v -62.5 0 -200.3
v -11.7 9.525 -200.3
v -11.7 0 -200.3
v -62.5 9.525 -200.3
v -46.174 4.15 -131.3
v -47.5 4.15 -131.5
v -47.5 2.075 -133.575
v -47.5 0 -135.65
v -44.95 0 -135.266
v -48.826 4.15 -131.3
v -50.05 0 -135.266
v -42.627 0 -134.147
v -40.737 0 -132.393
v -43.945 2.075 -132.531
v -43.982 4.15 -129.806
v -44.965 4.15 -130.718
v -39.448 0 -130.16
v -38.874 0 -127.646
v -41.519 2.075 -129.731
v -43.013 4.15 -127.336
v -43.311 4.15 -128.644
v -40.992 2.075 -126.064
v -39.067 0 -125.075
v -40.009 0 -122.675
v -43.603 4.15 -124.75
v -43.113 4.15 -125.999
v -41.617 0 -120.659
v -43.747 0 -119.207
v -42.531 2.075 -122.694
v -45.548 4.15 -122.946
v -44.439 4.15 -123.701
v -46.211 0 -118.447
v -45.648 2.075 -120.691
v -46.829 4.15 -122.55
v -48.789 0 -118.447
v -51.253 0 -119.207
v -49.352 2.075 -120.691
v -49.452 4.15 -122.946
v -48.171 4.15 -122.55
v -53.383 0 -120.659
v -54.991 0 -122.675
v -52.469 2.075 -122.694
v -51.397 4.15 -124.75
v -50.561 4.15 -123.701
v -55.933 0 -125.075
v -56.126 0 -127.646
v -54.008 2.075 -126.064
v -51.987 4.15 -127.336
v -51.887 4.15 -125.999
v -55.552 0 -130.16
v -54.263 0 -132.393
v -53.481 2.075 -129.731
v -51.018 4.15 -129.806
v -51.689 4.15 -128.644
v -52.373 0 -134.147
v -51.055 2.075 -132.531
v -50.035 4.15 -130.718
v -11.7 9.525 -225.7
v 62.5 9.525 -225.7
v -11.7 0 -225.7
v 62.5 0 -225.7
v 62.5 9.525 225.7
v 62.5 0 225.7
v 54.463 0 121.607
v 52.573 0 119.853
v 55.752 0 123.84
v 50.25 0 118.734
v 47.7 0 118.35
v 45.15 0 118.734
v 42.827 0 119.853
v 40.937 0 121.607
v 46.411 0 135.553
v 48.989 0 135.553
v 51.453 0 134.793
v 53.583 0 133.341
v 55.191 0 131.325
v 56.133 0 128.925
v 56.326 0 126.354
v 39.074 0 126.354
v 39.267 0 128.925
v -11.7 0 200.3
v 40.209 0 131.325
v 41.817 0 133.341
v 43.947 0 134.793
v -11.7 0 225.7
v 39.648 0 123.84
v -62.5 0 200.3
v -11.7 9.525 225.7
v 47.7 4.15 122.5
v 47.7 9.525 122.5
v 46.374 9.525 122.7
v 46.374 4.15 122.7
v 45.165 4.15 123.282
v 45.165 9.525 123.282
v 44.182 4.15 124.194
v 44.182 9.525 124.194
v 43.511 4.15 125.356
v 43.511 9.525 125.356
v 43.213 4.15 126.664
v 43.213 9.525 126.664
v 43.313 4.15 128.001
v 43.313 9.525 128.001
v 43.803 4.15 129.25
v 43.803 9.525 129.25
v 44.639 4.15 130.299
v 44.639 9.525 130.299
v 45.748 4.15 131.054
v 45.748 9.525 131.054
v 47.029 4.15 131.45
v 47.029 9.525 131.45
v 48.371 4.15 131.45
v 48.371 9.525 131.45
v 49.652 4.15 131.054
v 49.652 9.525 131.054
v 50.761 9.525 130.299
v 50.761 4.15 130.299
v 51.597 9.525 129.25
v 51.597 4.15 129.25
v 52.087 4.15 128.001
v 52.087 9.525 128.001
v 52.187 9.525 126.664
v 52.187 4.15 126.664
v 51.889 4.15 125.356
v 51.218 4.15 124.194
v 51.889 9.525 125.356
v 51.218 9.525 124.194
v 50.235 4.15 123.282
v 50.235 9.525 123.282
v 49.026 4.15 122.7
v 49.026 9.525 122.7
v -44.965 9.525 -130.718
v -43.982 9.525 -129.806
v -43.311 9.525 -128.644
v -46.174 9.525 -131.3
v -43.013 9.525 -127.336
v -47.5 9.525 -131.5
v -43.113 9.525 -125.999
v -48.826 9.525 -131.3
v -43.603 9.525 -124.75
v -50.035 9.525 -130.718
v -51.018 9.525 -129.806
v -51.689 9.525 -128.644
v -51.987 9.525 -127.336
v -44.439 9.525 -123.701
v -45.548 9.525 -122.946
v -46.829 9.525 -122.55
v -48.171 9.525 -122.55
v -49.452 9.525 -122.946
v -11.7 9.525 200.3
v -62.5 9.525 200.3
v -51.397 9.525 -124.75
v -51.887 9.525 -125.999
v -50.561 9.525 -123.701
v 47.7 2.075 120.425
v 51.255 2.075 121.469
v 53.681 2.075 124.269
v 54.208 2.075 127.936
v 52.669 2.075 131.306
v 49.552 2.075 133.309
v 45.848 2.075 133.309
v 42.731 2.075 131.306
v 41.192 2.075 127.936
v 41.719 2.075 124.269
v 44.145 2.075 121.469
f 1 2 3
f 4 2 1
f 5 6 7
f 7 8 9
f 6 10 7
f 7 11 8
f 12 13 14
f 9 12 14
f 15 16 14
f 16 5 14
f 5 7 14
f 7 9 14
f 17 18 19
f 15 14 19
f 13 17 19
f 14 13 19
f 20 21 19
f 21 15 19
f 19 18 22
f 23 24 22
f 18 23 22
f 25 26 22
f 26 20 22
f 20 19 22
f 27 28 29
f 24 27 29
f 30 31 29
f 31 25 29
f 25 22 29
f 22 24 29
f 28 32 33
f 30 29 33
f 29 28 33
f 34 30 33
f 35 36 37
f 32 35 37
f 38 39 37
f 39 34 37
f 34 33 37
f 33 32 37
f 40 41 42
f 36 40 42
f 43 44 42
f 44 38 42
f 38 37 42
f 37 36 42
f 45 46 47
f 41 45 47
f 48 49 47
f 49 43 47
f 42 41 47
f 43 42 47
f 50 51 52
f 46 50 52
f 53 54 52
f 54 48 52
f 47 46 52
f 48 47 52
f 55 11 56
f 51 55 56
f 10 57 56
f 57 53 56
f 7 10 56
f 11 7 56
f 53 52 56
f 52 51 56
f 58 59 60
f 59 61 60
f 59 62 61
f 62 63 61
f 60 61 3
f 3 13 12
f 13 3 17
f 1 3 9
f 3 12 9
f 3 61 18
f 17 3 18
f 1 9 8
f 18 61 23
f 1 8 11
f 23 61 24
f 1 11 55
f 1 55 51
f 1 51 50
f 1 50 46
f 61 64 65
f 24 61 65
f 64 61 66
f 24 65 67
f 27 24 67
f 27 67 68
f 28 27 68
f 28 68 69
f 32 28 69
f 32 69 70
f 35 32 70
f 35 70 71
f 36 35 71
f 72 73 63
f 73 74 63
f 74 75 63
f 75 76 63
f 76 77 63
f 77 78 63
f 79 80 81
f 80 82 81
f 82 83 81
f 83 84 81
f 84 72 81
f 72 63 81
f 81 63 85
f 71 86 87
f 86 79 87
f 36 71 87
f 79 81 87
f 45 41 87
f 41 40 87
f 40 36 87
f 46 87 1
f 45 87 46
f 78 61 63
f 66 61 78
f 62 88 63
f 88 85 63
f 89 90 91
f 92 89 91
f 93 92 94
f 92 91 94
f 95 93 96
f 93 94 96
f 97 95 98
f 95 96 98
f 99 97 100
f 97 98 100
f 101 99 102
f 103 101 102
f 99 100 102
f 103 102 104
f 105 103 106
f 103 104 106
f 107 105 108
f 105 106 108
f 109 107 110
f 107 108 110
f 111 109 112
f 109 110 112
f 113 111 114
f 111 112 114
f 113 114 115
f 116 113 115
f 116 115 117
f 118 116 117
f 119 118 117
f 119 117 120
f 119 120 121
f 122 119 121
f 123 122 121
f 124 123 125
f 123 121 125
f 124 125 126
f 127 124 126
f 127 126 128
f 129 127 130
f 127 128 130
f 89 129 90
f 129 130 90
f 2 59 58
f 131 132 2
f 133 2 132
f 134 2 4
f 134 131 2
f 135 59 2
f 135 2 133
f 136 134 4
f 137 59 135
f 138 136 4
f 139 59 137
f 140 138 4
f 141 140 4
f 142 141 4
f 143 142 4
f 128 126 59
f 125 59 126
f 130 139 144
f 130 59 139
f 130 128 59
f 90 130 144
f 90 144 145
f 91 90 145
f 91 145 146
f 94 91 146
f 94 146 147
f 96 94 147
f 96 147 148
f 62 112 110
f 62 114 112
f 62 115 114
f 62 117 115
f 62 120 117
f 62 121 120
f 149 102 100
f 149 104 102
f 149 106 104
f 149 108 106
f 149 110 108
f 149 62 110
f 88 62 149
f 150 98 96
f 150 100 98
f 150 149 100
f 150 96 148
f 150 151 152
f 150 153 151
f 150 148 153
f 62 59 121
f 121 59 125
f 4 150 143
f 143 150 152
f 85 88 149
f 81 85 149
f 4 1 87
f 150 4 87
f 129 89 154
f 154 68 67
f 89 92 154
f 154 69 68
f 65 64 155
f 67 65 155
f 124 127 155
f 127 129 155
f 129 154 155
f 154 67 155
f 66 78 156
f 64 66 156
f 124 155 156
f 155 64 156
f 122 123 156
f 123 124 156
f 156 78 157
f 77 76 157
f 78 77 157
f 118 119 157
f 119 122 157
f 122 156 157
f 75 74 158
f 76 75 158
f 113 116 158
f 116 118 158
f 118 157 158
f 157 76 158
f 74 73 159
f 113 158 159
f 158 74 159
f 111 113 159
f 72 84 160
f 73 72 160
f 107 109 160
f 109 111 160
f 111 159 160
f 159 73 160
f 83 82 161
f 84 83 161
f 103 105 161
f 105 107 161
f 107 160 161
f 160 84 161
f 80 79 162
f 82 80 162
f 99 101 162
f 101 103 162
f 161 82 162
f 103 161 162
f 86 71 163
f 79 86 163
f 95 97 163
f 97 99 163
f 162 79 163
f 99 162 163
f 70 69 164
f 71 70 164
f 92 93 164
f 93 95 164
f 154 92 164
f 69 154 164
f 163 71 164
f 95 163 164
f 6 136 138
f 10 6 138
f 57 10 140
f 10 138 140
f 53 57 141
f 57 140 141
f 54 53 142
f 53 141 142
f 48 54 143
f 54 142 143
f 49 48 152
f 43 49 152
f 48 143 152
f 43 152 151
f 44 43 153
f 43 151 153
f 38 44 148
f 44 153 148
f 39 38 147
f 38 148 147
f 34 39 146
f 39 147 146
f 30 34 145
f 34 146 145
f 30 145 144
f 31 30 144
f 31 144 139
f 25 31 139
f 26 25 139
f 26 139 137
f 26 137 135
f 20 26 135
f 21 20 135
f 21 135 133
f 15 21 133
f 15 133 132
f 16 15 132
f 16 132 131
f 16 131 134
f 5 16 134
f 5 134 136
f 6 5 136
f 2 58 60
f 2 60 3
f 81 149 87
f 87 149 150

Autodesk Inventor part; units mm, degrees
ref_plane "YZ Plane" through (0, 0, 0) normal (1, 0, 0) x (0, 1, 0)
ref_plane "XZ Plane" through (0, 0, 0) normal (0, 1, 0) x (-1, 0, 0)
ref_plane "XY Plane" through (0, 0, 0) normal (0, 0, 1) x (1, 0, 0)
sketch "Sketch1" plane through (0, 0, 0) normal (0, 1, 0) x (-1, 0, 0)
  line L0 (-62.5, -225.7) -> (62.5, -225.7)
  line L1 (62.5, -225.7) -> (62.5, 225.7)
  line L2 (62.5, 225.7) -> (-62.5, 225.7)
  line L3 (-62.5, 225.7) -> (-62.5, -225.7)
  line L4 (-62.5, -225.7) -> (62.5, 225.7) construction
  line L5 (62.5, -225.7) -> (-62.5, 225.7) construction
  point P0 (0, 0)
  dimension "d0" = 451.4
  dimension "d1" = 125
extrude "Extrusion1" add sketch "Sketch1" along normal blind 9.525
sketch "Sketch2" plane through (0, 9.525, 0) normal (0, 1, 0) x (1, 0, 0)
  line L0 (-62.5, 225.7) -> (-62.5, -225.7) projected
  line L1 (-62.5, -225.7) -> (-11.7, -225.7)
  line L2 (-11.7, -225.7) -> (-11.7, -200.3)
  line L3 (-11.7, -200.3) -> (-62.5, -200.3)
  line L4 (-62.5, -200.3) -> (-62.5, -225.7)
  line L5 (-62.5, 225.7) -> (-11.7, 225.7)
  line L6 (-11.7, 225.7) -> (-11.7, 200.3)
  line L7 (-11.7, 200.3) -> (-62.5, 200.3)
  line L8 (-62.5, 200.3) -> (-62.5, 225.7)
  point P0 (0, 0)
  point P1 (-62.5, 200.3)
  dimension "d4" = 25.4
  dimension "d5" = 25.4
  dimension "d6" = 50.8
  dimension "d7" = 50.8
extrude "Extrusion2" cut sketch "Sketch2" against normal through all
sketch "Sketch3" plane through (0, 0, 0) normal (0, 1, 0) x (1, 0, 0)
  line L0 (-62.5, 200.3) -> (-62.5, -200.3) projected
  line L1 (62.5, -225.7) -> (62.5, 225.7) projected
  point P0 (0, 0)
  point P1 (-47.5, 127)
  point P2 (47.7, -127)
  dimension "d10" = 254
  dimension "d11" = 95.2
  dimension "d12" = 127
  dimension "d13" = 15
  dimension "d14" = 14.8
hole "Hole1" at (-47.5, 0, -127) at (47.7, 0, 127) direction (0, 1, 0) diameter 9 end through all countersink diameter 17.3 countersink angle 90 clearance for "Flat Head Machine Screw" size "M8" standard "Ansi Metric M Profile"
equation "\"d5\" = d4"
equation "\"d7\" = d6"
equation "\"d12\" = 0.5 * d10"
properties part number "Shelf V1" material "Acetal Resin, Black"
